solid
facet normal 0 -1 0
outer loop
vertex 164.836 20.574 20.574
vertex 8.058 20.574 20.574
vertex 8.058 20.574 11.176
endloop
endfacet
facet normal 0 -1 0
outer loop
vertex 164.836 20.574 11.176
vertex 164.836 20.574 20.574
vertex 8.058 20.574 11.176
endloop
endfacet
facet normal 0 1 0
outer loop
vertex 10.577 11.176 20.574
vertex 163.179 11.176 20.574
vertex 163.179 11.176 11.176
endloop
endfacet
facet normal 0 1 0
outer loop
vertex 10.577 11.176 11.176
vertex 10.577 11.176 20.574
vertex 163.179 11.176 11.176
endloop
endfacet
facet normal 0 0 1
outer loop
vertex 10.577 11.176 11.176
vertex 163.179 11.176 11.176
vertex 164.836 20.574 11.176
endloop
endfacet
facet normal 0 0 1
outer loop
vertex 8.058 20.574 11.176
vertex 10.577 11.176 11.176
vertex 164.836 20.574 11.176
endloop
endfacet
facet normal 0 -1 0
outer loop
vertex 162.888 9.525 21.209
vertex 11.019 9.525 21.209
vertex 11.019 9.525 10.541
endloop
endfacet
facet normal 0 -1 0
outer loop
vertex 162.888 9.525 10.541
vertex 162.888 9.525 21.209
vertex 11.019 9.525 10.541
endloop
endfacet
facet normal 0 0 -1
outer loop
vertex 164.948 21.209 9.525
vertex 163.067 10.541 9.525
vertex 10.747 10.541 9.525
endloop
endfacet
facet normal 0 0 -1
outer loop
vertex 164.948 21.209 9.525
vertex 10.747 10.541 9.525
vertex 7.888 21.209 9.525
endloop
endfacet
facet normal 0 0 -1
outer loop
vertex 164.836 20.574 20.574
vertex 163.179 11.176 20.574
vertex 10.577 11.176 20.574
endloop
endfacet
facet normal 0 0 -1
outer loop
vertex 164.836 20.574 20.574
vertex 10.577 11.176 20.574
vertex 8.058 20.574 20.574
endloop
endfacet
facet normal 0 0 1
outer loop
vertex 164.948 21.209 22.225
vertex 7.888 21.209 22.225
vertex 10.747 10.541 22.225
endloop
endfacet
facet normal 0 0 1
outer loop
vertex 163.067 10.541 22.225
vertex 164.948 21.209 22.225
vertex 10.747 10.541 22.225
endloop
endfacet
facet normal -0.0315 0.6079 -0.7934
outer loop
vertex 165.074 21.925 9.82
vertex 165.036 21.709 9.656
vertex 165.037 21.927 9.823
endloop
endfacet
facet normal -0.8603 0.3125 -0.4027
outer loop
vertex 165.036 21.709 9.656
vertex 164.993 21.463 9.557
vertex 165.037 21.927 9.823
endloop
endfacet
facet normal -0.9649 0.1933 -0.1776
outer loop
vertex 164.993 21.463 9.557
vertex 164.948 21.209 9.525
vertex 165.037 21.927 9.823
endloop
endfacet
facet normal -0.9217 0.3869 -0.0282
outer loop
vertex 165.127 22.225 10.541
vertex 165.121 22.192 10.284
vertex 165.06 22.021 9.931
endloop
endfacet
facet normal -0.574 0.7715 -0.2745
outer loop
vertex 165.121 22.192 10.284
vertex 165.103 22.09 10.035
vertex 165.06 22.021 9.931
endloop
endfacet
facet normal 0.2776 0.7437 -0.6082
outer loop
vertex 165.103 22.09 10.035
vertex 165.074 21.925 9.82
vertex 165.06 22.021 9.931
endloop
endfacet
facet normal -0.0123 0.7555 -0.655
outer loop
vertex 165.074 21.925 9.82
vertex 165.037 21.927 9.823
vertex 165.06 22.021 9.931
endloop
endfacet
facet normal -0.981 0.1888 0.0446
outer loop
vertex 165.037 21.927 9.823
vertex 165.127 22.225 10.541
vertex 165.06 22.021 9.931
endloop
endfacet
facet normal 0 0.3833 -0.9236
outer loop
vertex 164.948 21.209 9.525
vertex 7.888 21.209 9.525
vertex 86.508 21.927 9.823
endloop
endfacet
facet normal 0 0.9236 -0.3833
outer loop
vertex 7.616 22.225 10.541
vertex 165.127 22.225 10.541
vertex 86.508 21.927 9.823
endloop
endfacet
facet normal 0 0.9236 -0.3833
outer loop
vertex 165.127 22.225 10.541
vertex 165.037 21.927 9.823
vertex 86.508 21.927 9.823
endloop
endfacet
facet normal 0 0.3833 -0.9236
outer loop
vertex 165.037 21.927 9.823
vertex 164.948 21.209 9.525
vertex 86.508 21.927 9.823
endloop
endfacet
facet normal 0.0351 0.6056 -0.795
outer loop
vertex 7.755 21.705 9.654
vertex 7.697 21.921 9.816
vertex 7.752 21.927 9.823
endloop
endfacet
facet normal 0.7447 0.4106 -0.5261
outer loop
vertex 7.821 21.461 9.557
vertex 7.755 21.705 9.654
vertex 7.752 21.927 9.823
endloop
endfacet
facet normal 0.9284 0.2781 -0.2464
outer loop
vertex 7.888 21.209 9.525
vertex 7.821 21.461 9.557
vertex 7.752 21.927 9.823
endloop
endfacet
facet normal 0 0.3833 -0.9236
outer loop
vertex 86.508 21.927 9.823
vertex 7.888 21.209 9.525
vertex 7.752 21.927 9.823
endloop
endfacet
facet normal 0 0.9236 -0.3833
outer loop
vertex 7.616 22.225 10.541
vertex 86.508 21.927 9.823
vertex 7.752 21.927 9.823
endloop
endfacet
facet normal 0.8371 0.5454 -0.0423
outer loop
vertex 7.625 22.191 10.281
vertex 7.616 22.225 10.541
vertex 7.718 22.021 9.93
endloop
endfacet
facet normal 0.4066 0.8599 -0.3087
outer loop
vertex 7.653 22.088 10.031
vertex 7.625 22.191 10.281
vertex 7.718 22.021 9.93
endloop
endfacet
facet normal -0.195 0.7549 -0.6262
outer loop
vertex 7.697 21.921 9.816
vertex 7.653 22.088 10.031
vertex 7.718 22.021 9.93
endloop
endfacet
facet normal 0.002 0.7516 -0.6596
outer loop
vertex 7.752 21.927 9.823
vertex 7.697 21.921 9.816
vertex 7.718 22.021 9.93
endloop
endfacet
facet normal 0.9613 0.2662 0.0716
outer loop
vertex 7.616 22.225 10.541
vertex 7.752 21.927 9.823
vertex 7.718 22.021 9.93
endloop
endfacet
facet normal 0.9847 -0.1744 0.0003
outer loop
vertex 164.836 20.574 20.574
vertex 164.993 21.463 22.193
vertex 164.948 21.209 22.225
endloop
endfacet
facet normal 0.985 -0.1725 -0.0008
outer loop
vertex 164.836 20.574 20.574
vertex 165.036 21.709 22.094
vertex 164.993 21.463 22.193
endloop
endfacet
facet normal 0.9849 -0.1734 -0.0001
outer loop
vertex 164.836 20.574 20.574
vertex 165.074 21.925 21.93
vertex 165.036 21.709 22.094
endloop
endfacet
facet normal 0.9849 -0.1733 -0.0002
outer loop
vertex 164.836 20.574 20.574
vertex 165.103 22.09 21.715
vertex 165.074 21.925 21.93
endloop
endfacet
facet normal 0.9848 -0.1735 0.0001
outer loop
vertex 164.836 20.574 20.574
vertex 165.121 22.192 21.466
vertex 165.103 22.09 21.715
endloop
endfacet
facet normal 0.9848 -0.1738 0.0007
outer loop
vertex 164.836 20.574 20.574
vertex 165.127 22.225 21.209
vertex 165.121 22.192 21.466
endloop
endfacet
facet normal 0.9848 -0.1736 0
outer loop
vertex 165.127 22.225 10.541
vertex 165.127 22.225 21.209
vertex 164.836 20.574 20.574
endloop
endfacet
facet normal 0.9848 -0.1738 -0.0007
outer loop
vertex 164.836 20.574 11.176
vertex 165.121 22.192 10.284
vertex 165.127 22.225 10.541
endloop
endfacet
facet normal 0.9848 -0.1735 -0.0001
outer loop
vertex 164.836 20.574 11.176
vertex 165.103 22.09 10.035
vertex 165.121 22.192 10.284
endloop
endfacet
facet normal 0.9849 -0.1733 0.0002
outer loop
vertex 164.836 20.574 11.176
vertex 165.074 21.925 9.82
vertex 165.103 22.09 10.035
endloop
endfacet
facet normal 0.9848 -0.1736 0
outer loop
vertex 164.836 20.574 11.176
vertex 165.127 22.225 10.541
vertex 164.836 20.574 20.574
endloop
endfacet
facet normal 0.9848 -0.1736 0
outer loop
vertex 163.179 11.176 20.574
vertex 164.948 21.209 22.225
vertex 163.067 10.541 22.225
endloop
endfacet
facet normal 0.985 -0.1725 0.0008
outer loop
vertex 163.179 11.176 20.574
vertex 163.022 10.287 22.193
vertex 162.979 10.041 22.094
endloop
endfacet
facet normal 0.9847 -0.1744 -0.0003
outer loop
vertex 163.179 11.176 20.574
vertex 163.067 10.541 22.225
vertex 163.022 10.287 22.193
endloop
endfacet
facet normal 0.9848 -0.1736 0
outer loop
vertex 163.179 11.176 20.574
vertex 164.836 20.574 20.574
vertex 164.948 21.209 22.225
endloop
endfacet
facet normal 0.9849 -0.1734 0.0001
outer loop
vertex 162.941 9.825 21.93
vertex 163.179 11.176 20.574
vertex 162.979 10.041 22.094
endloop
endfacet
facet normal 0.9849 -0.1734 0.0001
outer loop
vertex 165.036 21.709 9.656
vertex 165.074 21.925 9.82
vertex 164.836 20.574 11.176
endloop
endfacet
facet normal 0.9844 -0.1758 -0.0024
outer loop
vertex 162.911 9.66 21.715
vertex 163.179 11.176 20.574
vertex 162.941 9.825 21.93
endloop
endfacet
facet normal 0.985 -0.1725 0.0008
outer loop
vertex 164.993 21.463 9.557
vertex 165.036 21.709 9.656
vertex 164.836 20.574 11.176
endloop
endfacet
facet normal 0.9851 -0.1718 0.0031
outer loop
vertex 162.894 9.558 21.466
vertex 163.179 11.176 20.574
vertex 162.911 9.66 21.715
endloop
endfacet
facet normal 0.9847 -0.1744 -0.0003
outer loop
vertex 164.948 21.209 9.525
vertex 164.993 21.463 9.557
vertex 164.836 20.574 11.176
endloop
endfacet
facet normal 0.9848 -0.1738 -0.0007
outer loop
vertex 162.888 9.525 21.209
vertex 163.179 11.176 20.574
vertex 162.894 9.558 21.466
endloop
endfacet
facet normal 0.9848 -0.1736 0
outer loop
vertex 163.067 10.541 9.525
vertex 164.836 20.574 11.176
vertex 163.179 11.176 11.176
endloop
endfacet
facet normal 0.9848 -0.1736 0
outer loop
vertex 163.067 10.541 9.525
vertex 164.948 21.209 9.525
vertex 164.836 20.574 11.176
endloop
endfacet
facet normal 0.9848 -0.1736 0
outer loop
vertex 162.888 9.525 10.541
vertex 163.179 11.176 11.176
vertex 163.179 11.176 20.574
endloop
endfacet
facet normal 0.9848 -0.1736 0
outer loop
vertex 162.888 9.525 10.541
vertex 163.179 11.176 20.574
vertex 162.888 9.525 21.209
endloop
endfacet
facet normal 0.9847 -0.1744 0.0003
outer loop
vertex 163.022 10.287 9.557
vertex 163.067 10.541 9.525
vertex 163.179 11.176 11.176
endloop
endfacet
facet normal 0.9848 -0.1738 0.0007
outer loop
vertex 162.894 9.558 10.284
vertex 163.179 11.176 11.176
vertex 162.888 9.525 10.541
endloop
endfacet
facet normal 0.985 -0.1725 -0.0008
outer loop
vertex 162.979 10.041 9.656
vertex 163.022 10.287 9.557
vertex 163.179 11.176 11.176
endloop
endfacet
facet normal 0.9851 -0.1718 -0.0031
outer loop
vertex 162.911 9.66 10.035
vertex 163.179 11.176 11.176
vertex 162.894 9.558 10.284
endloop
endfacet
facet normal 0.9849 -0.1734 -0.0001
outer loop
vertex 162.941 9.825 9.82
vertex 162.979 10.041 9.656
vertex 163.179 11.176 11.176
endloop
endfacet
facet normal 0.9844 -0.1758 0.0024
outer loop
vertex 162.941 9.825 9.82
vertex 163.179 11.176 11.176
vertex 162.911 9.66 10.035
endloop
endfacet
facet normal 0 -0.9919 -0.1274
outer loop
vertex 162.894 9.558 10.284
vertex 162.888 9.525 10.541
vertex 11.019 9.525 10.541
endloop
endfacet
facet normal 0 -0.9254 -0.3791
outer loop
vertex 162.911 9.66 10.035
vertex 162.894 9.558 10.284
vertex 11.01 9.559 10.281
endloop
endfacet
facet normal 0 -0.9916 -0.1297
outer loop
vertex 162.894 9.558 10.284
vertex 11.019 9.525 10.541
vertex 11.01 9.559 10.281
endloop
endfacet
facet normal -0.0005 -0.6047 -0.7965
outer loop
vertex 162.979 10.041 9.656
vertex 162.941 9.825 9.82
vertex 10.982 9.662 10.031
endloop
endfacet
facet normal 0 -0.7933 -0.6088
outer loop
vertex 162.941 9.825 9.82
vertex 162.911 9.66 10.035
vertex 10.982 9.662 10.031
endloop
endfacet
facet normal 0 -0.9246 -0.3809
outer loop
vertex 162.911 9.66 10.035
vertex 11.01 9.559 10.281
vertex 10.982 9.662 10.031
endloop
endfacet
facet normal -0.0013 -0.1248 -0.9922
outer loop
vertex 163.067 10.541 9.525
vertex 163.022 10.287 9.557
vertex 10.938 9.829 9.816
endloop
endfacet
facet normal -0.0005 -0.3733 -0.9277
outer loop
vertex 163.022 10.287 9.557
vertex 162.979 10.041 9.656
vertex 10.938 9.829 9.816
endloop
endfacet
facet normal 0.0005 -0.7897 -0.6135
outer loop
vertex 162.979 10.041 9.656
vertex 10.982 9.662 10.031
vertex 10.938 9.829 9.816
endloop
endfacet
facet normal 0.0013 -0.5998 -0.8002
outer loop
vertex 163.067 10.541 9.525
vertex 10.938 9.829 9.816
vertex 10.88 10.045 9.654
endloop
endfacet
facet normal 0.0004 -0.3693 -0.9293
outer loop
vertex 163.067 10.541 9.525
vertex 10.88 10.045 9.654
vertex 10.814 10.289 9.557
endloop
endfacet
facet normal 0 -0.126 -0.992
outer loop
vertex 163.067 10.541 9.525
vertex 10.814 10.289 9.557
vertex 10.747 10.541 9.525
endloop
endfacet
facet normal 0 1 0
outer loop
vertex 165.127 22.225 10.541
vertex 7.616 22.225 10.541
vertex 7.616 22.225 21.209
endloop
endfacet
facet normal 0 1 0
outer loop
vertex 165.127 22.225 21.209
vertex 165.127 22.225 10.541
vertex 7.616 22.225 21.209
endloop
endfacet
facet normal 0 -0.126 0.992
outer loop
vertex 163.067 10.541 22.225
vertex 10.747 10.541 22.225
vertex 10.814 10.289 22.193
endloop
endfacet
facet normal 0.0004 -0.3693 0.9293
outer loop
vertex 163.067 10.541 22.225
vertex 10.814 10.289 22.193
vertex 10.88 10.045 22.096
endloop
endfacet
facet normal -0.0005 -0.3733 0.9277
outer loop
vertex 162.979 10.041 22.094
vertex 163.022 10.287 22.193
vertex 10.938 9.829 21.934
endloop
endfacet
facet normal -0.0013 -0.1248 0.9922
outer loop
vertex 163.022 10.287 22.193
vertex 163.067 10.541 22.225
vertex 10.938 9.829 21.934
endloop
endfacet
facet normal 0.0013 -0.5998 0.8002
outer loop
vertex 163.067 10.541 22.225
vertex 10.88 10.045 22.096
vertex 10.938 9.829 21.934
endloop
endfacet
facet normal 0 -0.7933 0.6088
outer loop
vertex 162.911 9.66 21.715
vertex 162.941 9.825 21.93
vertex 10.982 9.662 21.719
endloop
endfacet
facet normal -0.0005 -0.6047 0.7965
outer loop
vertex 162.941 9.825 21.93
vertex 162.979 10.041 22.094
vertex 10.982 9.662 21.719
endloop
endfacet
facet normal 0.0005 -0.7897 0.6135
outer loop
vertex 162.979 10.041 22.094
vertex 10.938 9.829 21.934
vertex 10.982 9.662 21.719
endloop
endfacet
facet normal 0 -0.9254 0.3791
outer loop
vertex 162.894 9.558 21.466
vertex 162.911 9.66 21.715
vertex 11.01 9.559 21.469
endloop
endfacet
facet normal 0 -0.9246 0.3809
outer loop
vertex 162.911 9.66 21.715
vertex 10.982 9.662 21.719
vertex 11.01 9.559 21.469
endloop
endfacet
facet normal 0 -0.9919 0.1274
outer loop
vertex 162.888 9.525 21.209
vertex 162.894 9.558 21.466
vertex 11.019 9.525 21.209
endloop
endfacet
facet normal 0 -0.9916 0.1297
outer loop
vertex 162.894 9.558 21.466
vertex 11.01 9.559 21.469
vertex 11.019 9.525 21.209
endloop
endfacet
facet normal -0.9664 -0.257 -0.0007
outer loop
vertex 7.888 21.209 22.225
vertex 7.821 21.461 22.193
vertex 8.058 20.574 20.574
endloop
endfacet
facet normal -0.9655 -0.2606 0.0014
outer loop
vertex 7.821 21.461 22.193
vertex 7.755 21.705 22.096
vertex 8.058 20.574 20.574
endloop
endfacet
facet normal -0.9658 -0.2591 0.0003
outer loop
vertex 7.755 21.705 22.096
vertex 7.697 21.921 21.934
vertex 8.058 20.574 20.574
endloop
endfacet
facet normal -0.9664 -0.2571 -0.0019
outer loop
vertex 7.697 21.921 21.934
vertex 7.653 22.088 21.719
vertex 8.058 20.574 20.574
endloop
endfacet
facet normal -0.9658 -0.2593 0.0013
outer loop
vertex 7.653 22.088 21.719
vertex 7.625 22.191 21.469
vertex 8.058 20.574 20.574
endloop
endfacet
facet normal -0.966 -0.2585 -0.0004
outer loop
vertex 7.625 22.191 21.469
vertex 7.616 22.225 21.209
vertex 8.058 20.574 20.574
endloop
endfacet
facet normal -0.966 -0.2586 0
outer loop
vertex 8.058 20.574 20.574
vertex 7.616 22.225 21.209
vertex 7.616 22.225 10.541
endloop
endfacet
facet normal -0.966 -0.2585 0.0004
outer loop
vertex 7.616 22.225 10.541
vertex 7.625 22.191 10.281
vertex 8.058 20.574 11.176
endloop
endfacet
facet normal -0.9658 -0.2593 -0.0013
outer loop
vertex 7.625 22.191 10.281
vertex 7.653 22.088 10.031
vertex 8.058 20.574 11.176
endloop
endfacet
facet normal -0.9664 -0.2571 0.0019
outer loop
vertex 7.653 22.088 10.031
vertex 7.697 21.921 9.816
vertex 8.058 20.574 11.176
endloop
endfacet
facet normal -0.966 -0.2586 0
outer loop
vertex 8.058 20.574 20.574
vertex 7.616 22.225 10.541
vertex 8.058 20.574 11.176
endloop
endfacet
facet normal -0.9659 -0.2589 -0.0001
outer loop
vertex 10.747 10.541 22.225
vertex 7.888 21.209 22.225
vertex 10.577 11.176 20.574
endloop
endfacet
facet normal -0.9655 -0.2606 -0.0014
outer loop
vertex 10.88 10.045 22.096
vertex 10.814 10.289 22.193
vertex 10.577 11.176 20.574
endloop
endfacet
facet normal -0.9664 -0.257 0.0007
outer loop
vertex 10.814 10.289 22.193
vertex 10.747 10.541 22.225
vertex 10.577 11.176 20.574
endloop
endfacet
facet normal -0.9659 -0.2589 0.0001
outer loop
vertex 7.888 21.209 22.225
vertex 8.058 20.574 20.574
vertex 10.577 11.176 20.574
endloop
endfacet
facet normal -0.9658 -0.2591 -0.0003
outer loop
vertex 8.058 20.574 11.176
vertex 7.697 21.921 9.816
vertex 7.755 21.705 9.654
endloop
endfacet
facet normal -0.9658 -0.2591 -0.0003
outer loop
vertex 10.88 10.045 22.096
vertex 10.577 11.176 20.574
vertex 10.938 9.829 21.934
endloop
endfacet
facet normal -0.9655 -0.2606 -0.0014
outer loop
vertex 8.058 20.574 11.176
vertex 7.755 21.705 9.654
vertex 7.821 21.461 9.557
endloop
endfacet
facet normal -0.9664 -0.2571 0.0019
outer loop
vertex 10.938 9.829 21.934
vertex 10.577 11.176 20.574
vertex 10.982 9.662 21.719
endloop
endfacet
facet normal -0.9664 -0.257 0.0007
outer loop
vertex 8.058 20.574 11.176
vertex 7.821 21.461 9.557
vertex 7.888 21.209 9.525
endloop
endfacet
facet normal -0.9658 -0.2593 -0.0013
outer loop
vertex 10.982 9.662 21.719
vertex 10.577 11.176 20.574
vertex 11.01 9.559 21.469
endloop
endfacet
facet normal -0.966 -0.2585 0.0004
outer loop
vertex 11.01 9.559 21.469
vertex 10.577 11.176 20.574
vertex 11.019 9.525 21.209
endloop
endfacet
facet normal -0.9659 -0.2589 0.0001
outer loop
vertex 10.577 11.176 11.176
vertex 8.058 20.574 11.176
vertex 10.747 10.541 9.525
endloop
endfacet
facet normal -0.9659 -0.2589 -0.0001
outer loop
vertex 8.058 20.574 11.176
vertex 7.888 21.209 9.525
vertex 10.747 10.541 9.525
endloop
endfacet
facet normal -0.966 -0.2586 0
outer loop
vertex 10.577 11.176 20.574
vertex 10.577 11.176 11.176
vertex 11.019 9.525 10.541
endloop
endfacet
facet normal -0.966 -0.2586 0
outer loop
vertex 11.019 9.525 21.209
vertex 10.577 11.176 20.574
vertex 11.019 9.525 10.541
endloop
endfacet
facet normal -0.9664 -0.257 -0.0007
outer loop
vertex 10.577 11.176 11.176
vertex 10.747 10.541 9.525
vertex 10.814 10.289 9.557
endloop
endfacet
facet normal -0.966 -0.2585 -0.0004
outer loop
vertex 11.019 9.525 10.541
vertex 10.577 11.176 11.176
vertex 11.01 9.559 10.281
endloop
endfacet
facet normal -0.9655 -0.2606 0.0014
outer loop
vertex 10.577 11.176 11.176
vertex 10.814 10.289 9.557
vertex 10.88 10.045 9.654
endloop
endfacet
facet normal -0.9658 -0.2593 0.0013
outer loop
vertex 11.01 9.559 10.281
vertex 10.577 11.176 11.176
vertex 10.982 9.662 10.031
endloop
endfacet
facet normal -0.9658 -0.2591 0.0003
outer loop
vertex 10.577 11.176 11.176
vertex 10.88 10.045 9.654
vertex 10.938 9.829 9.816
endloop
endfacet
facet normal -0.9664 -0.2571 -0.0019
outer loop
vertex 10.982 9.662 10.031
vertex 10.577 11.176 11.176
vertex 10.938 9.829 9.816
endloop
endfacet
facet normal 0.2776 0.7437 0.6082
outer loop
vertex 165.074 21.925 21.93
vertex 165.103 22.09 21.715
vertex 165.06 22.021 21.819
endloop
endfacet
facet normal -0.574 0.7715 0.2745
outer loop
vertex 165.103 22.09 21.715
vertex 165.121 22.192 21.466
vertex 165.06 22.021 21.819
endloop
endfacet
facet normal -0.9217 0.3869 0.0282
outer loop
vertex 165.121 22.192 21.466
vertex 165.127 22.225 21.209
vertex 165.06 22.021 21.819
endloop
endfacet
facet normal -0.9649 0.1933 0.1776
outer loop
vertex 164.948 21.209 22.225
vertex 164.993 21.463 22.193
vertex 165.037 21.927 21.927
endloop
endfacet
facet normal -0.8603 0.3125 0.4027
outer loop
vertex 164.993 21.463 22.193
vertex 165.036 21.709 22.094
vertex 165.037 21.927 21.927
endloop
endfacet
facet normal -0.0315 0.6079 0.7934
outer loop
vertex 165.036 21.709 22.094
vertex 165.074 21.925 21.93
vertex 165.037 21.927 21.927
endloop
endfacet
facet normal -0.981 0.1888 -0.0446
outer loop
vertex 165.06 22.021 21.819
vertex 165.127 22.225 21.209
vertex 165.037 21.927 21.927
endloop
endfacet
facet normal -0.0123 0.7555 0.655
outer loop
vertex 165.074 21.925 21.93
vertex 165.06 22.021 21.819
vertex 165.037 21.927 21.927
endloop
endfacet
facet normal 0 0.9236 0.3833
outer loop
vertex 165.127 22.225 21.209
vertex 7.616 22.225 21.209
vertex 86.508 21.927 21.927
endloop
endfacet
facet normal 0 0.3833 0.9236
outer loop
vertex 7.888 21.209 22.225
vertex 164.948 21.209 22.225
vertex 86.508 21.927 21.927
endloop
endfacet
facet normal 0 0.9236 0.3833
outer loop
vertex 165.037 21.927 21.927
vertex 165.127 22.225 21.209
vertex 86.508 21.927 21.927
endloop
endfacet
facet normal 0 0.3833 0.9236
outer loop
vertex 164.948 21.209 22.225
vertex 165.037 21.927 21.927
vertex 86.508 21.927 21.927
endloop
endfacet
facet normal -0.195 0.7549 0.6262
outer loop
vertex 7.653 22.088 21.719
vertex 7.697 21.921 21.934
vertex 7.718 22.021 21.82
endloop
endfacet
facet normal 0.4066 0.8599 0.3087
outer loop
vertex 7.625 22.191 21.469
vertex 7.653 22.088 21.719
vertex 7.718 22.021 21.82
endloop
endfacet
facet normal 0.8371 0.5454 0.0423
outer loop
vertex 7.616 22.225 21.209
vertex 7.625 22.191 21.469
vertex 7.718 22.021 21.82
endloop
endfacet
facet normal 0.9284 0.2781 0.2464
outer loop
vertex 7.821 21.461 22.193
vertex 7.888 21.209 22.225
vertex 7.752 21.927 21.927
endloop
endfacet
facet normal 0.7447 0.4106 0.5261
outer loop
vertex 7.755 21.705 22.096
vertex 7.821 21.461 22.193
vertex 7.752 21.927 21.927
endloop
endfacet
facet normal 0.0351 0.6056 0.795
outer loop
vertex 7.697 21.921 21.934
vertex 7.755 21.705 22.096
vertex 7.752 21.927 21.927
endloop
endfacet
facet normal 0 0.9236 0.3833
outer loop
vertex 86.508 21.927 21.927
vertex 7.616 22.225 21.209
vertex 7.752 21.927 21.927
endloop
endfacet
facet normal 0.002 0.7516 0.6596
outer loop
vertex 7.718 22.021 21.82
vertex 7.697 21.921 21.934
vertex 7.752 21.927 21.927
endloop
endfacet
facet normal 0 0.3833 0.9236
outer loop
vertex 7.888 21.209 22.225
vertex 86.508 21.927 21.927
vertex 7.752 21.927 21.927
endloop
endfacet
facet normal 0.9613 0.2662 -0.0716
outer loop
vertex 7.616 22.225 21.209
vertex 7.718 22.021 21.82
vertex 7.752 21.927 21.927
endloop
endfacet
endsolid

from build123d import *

# Parameters (mm, degrees)
SKETCH1_W           = 23.495
SKETCH1_H           = 23.495
BOSS_EXTRUDE1_DEPTH = 393.7
SCALE1_SCALE_X      = 1
SCALE1_SCALE_Y      = 0.4
SCALE1_SCALE_Z      = 0.4
CUT_EXTRUDE3_DEPTH  = 395.531279762


with BuildPart() as part:
    # Sketch1 → Boss-Extrude1 (new body)
    with BuildSketch(Plane(origin=(0, 0, 0), x_dir=(0, 0, -1), z_dir=(1, 0, 0))):
        with BuildLine():
            Line((0, 2.54), (0, 29.21))
            ThreePointArc((0, 29.21), (-0.743948776, 31.006051224), (-2.54, 31.75))
            Line((-2.54, 31.75), (-29.21, 31.75))
            ThreePointArc((-29.21, 31.75), (-31.006051224, 31.006051224), (-31.75, 29.21))
            Line((-31.75, 29.21), (-31.75, 2.54))
            ThreePointArc((-31.75, 2.54), (-31.006051224, 0.743948776), (-29.21, 0))
            Line((-29.21, 0), (-2.54, 0))
            ThreePointArc((-2.54, 0), (-0.743948776, 0.743948776), (0, 2.54))
        make_face()
        with Locations((-15.875, 15.875)):
            Rectangle(SKETCH1_W, SKETCH1_H, mode=Mode.SUBTRACT)
    extrude(amount=BOSS_EXTRUDE1_DEPTH)


with BuildPart() as part_1:
    # Scale1: scaled about (196.85, 15.875, 15.875)
    add(part.part.scale((SCALE1_SCALE_X, SCALE1_SCALE_Y, SCALE1_SCALE_Z), about=(196.85, 15.875, 15.875)))

    # Sketch5 → Cut-Extrude3 (cut, through all)
    with BuildSketch(Plane(origin=(0, 0, 9.525), x_dir=(-1, 0, 0), z_dir=(0, 0, -1))):
        Polygon((-195.500423074, 9.525), (-192.09746833, 22.225), (-165.127052911, 22.225), (-162.887700256, 9.525), align=None)
        Polygon((-11.018976282, 9.525), (0, 9.525), (0, 22.225), (-7.616021538, 22.225), align=None)
    extrude(amount=-CUT_EXTRUDE3_DEPTH, mode=Mode.SUBTRACT)


with BuildPart() as body_2:
    # of the pieces the cut leaves, the one that is kept (cut_extrude3_keep)
    add(part_1.part.solids().sort_by_distance((7.888257918, 21.209, 9.525))[0])


solid = body_2.part
